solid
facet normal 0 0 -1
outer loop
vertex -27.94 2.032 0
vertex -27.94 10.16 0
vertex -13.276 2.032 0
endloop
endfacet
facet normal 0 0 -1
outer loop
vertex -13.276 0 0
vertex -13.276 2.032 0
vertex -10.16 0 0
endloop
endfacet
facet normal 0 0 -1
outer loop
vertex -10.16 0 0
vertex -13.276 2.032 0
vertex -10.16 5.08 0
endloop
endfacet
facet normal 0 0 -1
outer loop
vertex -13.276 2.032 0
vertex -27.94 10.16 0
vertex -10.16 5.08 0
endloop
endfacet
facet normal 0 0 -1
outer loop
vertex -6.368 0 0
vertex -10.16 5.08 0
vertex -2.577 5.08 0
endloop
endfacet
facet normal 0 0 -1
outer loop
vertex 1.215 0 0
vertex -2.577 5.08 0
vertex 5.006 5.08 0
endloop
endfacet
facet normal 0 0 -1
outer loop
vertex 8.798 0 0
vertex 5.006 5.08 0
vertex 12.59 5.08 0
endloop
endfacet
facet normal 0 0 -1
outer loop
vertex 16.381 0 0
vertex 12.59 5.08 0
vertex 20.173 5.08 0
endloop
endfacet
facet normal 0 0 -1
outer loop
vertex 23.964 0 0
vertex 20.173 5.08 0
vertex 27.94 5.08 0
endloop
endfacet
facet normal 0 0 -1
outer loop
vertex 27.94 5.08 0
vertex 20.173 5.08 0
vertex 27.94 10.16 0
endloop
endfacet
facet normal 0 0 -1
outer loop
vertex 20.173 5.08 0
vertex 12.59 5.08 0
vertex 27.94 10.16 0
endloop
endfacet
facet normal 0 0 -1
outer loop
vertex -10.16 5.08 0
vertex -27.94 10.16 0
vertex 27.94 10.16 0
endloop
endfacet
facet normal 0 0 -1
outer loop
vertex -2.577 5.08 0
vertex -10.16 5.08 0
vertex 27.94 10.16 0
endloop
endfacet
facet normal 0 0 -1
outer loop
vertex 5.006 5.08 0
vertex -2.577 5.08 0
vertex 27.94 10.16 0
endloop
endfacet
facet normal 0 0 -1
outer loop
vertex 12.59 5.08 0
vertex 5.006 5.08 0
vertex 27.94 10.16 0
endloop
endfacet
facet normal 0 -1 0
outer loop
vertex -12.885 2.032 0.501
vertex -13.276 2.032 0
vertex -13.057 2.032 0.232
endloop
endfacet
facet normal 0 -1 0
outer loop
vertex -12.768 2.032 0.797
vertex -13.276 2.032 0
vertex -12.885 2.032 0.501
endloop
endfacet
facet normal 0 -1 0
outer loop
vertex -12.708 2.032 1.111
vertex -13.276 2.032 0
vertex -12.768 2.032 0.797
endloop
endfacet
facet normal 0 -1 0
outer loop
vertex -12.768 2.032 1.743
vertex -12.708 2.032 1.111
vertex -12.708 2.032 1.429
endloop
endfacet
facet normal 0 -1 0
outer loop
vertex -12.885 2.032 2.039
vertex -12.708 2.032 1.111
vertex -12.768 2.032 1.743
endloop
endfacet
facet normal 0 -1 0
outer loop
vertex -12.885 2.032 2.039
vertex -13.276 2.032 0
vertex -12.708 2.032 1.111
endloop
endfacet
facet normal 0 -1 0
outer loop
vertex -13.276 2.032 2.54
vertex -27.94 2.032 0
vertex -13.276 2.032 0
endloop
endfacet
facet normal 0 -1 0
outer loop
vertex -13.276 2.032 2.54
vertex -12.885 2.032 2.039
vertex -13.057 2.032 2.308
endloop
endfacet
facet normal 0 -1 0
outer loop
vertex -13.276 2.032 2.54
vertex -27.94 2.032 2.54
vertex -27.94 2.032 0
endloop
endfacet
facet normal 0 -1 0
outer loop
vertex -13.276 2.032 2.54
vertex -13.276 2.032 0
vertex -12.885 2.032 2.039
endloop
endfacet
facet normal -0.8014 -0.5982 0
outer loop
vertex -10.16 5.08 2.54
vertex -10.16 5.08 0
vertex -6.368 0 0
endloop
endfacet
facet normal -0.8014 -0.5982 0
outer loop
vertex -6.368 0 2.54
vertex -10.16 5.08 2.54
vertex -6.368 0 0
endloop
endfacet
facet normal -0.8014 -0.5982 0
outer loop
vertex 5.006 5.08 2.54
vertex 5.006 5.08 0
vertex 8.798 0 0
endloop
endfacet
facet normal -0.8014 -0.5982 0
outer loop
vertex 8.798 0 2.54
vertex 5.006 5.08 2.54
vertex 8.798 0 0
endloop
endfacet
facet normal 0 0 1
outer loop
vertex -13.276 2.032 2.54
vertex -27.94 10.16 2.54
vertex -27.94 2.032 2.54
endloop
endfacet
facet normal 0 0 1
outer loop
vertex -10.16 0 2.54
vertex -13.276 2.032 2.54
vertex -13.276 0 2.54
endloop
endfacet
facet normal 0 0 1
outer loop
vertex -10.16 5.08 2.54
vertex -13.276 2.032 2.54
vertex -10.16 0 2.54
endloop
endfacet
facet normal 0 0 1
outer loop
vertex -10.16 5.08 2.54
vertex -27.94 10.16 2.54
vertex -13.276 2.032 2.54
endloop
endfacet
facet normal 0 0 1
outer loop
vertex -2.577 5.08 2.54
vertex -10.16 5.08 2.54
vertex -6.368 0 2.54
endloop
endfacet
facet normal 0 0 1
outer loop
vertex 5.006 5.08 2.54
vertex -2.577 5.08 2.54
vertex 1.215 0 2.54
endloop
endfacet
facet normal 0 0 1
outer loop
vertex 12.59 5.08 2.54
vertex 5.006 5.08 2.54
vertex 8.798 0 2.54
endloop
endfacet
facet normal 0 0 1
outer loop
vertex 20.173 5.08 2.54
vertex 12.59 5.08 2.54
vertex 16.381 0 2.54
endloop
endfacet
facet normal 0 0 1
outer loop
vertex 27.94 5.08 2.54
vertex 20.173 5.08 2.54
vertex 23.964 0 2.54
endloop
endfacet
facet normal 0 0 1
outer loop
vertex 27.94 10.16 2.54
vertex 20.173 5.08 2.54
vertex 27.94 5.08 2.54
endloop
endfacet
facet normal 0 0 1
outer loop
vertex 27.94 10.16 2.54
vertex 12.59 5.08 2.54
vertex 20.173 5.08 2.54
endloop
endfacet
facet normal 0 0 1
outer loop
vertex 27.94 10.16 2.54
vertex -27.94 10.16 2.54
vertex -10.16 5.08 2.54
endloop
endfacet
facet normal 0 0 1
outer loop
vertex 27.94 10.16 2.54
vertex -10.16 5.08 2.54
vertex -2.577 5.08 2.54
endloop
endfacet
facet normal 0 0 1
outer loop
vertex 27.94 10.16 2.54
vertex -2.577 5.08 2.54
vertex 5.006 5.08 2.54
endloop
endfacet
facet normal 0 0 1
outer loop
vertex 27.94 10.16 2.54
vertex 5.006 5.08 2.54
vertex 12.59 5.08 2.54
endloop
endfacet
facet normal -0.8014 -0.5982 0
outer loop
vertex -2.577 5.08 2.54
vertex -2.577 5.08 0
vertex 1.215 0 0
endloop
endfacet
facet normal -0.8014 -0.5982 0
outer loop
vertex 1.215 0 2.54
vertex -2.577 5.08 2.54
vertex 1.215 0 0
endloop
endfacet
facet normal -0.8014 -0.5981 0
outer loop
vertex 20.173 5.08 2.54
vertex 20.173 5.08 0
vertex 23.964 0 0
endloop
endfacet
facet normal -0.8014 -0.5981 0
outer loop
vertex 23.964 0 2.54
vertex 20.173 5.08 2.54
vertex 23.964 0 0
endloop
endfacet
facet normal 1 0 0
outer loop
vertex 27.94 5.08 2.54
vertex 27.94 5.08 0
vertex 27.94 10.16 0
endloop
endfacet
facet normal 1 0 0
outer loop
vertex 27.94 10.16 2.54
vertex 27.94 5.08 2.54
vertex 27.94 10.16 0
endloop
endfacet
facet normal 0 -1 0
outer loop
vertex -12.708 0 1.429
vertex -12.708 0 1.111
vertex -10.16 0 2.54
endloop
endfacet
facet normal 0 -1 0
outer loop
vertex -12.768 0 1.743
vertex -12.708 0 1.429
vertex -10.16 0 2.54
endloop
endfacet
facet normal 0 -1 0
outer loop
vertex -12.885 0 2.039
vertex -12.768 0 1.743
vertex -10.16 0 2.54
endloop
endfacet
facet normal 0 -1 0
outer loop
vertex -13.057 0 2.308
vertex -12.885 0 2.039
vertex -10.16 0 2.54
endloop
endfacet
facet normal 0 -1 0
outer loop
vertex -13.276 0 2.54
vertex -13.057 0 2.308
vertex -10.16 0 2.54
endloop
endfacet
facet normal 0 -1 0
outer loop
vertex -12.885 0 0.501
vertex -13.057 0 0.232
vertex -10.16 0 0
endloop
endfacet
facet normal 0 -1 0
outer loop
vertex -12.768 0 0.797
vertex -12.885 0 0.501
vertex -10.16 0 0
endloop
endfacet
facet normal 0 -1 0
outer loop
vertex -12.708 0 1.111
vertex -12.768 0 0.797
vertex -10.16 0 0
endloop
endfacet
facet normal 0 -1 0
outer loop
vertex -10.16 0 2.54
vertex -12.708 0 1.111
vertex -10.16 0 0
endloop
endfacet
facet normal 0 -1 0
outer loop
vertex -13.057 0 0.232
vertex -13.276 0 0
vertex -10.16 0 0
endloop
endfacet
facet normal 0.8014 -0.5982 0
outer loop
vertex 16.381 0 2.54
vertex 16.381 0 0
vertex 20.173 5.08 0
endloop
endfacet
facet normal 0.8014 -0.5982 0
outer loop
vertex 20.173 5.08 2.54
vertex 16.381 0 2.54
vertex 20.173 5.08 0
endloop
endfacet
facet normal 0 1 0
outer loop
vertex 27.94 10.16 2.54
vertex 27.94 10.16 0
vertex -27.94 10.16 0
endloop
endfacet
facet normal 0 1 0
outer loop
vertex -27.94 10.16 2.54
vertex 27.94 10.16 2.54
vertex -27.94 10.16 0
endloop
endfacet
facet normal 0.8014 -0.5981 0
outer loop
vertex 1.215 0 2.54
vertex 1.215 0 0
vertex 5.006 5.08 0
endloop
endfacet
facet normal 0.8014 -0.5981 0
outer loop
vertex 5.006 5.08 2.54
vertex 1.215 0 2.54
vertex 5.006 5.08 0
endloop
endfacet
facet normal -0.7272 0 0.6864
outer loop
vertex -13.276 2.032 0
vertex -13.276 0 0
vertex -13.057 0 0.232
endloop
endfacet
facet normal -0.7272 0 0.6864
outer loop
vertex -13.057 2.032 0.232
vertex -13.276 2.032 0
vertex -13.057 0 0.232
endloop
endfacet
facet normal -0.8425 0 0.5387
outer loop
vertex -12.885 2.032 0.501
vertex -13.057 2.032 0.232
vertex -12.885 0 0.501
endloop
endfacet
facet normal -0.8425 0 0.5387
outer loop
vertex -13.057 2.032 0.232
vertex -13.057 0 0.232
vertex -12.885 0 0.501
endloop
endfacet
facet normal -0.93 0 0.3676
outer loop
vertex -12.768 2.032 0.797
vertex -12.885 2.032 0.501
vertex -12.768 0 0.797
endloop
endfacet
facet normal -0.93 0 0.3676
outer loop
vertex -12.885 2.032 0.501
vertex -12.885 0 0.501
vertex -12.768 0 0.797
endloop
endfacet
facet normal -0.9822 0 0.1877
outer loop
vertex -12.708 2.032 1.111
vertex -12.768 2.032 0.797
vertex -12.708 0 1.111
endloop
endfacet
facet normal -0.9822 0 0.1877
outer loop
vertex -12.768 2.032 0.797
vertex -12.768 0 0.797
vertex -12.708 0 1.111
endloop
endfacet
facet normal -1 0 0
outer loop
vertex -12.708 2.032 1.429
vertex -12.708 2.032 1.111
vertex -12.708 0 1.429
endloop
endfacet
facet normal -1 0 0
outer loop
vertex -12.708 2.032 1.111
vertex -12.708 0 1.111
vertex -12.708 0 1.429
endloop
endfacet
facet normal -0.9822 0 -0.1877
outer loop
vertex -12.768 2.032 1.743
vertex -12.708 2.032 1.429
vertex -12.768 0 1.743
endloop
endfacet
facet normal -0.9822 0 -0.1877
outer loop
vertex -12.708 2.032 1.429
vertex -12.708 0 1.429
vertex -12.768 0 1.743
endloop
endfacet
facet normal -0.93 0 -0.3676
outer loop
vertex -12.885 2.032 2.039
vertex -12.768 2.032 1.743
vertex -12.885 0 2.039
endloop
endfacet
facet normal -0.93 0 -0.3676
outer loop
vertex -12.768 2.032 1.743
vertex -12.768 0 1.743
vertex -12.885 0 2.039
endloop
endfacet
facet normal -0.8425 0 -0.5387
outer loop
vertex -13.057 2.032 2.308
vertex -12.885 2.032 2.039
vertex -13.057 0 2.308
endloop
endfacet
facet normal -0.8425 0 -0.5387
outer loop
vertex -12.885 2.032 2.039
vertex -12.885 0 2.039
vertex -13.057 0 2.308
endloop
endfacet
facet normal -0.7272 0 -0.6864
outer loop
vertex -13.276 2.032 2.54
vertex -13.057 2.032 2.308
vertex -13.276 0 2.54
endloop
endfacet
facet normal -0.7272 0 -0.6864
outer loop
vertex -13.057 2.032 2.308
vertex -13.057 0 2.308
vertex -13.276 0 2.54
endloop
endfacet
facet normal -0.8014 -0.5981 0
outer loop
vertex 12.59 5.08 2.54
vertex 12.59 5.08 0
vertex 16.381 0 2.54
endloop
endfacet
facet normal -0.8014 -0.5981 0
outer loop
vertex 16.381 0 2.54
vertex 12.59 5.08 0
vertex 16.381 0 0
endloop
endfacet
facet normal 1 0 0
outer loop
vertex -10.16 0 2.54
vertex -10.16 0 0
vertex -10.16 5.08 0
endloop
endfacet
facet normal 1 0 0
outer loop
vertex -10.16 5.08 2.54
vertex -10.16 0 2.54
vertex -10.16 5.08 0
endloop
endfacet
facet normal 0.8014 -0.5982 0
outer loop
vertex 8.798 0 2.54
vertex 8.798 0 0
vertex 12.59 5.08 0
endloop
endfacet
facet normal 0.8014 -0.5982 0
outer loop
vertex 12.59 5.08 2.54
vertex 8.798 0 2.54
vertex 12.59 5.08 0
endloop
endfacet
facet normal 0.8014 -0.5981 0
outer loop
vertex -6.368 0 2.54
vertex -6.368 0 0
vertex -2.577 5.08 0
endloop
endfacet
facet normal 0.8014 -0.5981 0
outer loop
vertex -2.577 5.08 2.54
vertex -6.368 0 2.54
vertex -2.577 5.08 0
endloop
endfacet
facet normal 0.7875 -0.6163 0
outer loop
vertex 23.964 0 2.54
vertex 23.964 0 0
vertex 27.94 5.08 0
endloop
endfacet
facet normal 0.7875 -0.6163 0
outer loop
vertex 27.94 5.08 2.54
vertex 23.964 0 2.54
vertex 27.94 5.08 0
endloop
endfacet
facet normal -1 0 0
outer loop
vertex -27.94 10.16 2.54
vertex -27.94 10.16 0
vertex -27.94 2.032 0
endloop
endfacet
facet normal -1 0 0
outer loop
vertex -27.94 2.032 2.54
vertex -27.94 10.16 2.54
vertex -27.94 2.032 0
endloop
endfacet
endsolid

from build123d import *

# Parameters (mm, degrees)
BOSS_EXTRUDE1_DEPTH = 2.54
CUT_EXTRUDE2_DEPTH  = 2.032


with BuildPart() as part:
    # Sketch1 → Boss-Extrude1 (new body)
    with BuildSketch(Plane.XY):
        Polygon((-27.94, 0), (-10.16, 0), (-10.16, 5.08), (-6.368400563, 0), (-2.576801125, 5.08), (1.214798312, 0), (5.006397749, 5.08), (8.797997187, 0), (12.589596624, 5.08), (16.381196061, 0), (20.172795499, 5.08), (23.964394936, 0), (27.94, 5.08), (27.94, 10.16), (-27.94, 10.16), align=None)
    extrude(amount=BOSS_EXTRUDE1_DEPTH)

    # Sketch2 → Cut-Extrude2 (cut)
    with BuildSketch(Plane.XZ):
        with BuildLine():
            Line((-27.94, 0), (-13.275788511, 0))
            ThreePointArc((-13.275788511, 0), (-12.7, 1.27), (-13.275788511, 2.54))
            Line((-13.275788511, 2.54), (-27.94, 2.54))
            Line((-27.94, 2.54), (-27.94, 0))
        make_face()
    extrude(amount=-CUT_EXTRUDE2_DEPTH, mode=Mode.SUBTRACT)


solid = part.part
